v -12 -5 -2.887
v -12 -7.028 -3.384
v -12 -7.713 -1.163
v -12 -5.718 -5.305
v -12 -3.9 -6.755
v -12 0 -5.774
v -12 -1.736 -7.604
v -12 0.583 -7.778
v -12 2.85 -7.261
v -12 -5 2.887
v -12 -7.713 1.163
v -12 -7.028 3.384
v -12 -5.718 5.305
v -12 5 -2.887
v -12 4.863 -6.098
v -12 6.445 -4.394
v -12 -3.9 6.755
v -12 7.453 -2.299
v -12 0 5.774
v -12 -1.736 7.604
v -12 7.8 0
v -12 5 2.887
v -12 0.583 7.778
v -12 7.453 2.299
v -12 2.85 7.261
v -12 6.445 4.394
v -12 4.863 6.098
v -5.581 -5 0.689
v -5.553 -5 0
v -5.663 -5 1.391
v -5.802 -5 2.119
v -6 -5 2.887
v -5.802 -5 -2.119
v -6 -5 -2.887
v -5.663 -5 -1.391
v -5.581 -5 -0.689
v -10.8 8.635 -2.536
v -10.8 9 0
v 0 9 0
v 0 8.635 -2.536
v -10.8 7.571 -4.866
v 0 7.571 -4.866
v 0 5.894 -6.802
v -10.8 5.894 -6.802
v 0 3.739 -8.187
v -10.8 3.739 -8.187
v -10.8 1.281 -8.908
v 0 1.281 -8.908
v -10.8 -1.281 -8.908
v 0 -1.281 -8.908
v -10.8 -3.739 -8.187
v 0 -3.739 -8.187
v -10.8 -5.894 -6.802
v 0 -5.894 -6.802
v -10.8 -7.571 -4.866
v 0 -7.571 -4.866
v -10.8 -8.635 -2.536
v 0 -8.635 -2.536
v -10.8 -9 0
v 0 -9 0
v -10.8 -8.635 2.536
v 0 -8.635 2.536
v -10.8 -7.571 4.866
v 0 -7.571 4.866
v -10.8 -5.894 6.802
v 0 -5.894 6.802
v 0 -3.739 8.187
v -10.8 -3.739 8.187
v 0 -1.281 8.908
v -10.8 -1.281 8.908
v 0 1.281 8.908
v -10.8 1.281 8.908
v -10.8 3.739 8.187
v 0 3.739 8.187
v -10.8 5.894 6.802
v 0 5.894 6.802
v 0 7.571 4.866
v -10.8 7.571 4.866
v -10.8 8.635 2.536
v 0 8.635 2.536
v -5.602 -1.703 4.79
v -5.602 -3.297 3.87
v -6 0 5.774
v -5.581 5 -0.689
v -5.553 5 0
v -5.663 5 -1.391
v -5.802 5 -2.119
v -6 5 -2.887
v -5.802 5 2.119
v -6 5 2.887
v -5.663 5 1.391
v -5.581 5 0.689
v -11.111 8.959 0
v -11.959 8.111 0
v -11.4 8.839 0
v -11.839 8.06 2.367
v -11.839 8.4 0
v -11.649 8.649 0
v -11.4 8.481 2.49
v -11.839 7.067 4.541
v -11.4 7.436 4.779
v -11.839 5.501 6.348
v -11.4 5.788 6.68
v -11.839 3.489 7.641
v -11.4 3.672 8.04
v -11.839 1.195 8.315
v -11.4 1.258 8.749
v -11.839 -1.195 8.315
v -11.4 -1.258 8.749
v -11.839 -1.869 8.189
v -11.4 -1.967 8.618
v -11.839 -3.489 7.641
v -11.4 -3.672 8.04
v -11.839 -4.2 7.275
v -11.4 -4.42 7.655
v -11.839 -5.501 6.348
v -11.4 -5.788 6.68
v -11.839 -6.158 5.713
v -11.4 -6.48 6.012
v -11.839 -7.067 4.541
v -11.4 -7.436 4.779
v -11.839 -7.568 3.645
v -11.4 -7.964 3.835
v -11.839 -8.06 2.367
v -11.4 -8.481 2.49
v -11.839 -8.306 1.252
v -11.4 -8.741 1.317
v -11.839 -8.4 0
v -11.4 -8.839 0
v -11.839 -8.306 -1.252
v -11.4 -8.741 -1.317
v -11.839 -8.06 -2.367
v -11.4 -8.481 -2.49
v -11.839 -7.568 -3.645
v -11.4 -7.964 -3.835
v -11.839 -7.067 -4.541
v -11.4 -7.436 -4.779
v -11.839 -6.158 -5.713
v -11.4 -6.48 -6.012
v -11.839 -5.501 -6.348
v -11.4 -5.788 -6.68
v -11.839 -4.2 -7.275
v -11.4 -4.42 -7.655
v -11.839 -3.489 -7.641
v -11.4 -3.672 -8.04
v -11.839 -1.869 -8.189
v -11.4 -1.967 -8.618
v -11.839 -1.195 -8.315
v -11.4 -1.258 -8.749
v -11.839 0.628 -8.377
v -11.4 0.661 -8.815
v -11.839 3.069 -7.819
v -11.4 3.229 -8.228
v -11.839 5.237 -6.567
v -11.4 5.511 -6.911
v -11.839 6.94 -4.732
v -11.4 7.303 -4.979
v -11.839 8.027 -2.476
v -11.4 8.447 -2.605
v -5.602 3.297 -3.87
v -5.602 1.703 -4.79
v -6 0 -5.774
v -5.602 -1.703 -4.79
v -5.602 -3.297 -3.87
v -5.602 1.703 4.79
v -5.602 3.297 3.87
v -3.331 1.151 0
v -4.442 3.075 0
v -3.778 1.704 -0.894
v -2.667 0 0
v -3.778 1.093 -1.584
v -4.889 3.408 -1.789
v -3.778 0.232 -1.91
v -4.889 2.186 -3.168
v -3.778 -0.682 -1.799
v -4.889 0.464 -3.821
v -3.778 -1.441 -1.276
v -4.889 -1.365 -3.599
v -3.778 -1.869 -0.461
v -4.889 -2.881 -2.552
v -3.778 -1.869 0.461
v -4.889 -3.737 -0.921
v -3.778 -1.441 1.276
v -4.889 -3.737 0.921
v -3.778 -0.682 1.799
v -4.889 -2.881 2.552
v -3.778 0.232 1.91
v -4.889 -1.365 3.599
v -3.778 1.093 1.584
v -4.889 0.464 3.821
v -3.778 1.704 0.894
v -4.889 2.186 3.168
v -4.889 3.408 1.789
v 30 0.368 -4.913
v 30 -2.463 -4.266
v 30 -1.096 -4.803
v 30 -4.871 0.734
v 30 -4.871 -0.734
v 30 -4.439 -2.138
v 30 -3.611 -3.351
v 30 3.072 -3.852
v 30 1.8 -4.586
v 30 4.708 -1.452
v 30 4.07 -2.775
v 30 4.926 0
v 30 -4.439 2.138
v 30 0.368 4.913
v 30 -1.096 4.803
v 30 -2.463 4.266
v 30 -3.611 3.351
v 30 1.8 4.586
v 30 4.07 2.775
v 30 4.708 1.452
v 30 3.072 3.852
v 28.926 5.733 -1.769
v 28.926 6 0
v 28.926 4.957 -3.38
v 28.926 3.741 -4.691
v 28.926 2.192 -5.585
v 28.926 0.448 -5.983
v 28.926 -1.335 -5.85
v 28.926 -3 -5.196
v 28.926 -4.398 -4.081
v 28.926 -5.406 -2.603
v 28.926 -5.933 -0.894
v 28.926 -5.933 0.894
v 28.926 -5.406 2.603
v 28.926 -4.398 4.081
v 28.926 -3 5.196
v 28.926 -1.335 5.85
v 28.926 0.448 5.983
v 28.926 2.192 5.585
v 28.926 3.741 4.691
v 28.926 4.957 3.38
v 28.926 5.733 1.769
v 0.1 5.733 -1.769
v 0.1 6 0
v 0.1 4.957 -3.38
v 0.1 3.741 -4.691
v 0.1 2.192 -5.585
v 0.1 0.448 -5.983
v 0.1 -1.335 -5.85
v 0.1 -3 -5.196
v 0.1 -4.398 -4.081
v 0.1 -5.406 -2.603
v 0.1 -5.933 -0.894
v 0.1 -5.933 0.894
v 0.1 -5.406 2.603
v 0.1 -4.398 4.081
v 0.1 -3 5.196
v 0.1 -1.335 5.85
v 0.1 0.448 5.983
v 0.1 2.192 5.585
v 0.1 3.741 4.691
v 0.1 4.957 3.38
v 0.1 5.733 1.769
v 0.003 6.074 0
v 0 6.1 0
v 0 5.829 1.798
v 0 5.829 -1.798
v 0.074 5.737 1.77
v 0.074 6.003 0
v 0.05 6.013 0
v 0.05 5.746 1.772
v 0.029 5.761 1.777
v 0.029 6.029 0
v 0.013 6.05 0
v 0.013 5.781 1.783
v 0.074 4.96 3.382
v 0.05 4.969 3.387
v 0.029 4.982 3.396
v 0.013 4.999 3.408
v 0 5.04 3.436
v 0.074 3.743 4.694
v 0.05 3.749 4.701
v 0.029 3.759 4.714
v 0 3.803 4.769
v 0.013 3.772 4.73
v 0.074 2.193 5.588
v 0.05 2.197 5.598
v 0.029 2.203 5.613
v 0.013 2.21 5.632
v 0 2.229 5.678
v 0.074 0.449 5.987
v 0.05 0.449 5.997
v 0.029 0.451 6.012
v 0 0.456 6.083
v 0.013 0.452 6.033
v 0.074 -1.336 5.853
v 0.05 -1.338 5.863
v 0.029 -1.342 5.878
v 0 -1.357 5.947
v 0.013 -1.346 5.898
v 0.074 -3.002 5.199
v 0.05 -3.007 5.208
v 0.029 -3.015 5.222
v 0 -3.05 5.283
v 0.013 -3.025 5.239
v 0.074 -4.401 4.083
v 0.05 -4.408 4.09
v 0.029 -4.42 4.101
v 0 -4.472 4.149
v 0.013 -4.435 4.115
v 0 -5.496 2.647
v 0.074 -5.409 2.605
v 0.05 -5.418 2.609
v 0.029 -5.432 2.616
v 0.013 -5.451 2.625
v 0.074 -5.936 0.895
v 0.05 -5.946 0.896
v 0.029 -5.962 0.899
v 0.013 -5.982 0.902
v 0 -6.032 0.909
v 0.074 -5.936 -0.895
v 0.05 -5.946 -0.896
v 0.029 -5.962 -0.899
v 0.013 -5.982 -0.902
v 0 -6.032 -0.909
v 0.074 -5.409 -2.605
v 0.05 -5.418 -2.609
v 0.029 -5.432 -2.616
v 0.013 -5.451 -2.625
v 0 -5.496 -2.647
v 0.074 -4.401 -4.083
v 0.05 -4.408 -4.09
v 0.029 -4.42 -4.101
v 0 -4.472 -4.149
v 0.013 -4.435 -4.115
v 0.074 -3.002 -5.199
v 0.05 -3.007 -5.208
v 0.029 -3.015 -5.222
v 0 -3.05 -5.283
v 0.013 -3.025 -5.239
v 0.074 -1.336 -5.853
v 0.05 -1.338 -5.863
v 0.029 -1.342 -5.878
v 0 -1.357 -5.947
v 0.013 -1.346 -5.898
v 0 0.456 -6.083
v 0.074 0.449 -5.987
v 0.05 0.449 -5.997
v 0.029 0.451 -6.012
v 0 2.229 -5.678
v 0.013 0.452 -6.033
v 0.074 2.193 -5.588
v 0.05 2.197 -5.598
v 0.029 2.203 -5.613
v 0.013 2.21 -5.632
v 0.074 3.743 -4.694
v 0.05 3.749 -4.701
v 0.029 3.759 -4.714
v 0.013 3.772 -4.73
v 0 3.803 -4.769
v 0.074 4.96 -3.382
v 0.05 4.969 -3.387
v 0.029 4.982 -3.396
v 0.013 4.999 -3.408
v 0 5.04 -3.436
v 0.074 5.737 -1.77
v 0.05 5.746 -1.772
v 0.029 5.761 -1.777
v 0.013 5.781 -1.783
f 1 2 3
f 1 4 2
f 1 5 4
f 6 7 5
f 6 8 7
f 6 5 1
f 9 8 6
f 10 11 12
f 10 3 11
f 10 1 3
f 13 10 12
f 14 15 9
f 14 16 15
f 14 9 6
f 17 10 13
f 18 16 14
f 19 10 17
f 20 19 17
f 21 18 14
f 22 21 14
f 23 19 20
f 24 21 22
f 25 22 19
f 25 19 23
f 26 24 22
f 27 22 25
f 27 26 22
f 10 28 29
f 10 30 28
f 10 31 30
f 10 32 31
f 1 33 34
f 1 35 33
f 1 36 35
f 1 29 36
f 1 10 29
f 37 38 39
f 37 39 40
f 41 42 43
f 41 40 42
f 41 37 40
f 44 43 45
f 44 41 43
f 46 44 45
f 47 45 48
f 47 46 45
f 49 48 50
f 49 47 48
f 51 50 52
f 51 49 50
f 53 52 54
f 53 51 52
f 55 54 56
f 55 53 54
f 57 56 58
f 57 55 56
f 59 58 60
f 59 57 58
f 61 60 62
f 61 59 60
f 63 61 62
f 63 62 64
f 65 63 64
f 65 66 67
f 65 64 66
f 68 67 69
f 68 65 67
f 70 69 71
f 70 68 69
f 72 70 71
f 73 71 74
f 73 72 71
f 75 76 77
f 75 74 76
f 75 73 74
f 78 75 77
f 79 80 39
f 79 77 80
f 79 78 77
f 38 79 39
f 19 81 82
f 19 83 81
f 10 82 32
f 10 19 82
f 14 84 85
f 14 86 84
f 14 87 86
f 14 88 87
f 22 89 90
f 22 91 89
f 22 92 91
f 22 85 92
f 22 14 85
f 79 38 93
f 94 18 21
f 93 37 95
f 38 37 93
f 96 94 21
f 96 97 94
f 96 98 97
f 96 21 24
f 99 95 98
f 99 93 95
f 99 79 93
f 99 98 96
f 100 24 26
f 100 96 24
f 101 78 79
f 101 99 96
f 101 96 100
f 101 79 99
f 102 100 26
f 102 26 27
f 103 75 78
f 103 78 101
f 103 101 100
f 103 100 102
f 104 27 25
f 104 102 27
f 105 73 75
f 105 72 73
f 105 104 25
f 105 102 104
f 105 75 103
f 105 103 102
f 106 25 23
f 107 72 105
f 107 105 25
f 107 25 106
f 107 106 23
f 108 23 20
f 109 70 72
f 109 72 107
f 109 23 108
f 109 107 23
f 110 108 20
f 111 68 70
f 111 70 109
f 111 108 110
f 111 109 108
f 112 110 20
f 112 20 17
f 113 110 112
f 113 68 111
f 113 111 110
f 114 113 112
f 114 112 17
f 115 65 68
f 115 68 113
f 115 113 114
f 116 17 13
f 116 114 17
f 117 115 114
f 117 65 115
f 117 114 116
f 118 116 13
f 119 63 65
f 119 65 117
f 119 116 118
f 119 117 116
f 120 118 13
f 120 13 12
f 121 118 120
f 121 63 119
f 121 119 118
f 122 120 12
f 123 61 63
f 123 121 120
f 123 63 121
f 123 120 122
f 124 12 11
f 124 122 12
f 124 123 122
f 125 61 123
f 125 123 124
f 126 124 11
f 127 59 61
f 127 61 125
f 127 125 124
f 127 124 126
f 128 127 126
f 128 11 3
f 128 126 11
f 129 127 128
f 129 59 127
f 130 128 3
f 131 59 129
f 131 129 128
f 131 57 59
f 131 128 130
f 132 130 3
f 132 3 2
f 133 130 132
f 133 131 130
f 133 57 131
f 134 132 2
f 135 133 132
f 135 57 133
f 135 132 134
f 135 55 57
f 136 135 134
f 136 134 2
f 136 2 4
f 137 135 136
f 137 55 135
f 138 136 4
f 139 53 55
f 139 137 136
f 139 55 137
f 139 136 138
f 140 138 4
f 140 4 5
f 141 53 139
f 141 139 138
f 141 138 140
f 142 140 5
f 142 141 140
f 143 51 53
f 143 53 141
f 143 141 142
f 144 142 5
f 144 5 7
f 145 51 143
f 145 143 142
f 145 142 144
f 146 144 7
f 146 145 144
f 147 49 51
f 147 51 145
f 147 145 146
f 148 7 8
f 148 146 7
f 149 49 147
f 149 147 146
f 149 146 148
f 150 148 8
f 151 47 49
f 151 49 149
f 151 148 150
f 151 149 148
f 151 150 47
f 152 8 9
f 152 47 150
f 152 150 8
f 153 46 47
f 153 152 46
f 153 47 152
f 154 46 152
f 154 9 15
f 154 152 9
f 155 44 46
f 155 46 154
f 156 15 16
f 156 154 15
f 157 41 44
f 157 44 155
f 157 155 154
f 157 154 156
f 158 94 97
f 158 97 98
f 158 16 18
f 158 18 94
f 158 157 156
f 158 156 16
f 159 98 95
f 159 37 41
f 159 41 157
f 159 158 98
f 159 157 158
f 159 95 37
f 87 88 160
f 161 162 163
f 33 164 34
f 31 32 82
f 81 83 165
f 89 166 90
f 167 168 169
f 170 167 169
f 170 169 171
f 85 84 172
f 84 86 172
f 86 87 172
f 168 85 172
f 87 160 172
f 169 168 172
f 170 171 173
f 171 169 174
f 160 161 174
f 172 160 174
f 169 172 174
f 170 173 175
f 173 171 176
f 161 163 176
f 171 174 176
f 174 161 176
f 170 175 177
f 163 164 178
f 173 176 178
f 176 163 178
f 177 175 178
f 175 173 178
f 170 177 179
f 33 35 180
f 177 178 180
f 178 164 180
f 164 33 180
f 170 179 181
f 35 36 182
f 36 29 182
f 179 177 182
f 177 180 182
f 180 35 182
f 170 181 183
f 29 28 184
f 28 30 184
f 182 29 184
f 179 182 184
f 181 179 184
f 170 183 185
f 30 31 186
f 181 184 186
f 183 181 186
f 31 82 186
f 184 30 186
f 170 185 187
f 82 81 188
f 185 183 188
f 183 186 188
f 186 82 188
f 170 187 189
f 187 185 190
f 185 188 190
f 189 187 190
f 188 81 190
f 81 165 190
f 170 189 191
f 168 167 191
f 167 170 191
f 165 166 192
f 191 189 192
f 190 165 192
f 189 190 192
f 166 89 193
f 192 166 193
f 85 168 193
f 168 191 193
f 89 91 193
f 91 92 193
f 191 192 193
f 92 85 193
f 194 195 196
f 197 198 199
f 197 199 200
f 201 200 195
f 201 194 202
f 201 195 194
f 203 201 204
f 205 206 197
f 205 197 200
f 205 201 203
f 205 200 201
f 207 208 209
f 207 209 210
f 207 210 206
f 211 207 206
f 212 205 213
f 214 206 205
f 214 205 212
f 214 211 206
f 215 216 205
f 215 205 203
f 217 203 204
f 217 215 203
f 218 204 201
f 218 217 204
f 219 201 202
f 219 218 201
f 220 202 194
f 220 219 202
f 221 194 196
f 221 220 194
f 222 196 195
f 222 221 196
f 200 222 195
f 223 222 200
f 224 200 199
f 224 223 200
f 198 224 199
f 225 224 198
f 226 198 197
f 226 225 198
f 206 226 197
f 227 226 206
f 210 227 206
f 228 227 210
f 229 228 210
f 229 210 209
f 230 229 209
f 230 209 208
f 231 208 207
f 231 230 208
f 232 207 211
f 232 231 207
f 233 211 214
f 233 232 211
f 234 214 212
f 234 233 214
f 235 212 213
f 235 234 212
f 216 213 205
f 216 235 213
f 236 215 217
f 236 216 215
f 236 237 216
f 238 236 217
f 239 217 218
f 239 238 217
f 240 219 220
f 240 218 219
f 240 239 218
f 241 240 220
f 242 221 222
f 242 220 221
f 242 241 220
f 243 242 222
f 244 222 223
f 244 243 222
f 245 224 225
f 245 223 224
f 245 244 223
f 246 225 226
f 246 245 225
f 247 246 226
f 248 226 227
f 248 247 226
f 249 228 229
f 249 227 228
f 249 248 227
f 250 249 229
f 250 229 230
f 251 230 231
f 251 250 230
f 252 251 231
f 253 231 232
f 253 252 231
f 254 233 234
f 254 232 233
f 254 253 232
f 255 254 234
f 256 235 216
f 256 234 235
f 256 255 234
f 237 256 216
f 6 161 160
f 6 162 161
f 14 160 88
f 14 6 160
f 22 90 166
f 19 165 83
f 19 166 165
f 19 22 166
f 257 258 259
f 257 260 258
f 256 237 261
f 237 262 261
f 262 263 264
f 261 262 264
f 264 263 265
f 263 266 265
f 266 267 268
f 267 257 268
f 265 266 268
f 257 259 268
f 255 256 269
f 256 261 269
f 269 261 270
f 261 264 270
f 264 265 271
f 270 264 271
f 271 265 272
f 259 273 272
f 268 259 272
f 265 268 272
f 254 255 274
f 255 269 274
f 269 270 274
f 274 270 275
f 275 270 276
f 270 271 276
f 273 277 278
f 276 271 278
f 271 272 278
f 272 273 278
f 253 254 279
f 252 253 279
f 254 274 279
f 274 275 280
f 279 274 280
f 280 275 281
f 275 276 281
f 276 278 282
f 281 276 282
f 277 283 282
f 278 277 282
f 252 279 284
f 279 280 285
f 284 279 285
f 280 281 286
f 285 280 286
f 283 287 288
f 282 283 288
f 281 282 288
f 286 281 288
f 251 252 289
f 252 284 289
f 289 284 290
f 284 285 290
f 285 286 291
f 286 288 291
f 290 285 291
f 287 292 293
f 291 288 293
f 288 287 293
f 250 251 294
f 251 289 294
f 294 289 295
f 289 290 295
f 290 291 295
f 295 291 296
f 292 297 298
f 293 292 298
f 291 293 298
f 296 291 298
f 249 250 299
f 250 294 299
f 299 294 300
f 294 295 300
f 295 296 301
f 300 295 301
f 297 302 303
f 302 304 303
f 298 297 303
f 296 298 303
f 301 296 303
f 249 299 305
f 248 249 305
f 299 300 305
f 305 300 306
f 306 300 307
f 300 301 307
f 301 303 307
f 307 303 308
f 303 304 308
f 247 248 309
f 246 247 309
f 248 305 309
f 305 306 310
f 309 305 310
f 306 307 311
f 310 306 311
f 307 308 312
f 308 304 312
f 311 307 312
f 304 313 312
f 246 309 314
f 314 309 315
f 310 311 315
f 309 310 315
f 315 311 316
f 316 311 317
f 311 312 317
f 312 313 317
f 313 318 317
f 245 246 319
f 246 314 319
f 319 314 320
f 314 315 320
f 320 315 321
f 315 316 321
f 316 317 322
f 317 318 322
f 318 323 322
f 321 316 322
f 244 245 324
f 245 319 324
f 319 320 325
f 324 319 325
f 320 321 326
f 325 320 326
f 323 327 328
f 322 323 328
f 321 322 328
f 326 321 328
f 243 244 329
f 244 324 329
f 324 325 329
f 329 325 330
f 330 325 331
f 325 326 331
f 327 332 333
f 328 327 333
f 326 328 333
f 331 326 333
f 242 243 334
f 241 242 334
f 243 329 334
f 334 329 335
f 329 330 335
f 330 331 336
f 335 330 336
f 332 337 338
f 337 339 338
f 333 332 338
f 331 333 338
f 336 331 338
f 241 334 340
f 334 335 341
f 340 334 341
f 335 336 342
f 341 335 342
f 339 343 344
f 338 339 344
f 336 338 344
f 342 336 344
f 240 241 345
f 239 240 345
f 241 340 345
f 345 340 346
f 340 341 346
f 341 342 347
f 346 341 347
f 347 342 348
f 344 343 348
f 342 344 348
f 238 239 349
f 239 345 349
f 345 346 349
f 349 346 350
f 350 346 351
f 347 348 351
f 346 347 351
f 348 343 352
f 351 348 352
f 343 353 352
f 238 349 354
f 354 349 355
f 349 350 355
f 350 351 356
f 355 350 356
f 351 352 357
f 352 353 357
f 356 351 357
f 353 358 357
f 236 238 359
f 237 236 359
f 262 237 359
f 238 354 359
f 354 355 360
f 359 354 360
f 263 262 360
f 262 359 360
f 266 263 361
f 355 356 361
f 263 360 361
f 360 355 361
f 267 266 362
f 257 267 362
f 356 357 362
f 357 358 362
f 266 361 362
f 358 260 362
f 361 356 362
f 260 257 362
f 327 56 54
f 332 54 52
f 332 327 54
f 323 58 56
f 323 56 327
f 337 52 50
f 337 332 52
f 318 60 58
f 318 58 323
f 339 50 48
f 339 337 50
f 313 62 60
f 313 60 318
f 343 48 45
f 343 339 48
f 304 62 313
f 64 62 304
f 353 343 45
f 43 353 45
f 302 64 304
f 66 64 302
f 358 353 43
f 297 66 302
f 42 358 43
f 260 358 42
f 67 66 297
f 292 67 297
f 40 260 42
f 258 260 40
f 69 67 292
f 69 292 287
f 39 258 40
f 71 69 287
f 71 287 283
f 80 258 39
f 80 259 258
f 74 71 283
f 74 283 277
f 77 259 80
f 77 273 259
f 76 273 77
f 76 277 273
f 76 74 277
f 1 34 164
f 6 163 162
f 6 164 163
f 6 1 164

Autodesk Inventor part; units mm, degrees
ref_plane "YZ Plane" through (0, 0, 0) normal (1, 0, 0) x (0, 1, 0)
ref_plane "XZ Plane" through (0, 0, 0) normal (0, 1, 0) x (-1, 0, 0)
sketch "Sketch1" plane through (0, 0, 0) normal (0, 0, 1) x (1, 0, 0)
  line L0 (-2.6667, 0) -> (30, 0)
  line L1 (30, 0) -> (30, 6)
  line L2 (30, 6) -> (4.375, 6)
  line L3 (4.375, 6) -> (3.3014, 6)
  line L4 (3.3014, 6) -> (0, 6)
  line L5 (0, 6) -> (0, 9)
  line L6 (0, 9) -> (-12, 9)
  line L7 (-12, 9) -> (-12, 5.7735)
  line L8 (-12, 5.7735) -> (-6, 5.7735)
  line L9 (-6, 5.7735) -> (-2.6667, 0)
  line L10 (-20.4, 0) -> (38.4, 0) projected
  line L11 (0, -1.8) -> (0, 10.8) projected
  line L12 (4.375, 6) -> (0, 6) construction
  dimension "d1" = 25.625
  dimension "d2" = 1.0736
  dimension "d3" = 12
  dimension "d4" = 6
  dimension "d5" = 60
  dimension "d6" = 12
  dimension "d7" = 12
  dimension "d8" = 11.547
  dimension "d9" = 18
  dimension "d26" = 30
revolve "Body" add sketch "Sketch1" angle 360 about axis through (-2.6667, 0, 0) along (1, 0, 0)
sketch "Sketch2" plane through (-12, 0, 0) normal (-1, 0, 0) x (0, 0, 1)
  circle A0 centre (0, 0) radius 5.7735 projected
  line L0 (0, -12.6) -> (0, 12.6) projected
  line L1 (-12.6, 0) -> (12.6, 0) projected
  line L2 (5.7735, 0) -> (2.8868, -5)
  line L3 (2.8868, -5) -> (-2.8868, -5)
  line L4 (-2.8868, -5) -> (-5.7735, 0)
  line L5 (-5.7735, 0) -> (-2.8868, 5)
  line L6 (-2.8868, 5) -> (2.8868, 5)
  line L7 (2.8868, 5) -> (5.7735, 0)
extrude "Slot" add sketch "Sketch2" against normal up to next contours L7 A0 | A0 L2 | L6 L0 A0 | A0 L0 L3 | L0 L6 A0 | A0 L3 L0 | L4 A0 | A0 L5
fillet "Fillet1" radius 1.2 1 edges at (-12, -9, 0)
thread "Thread" size "M12x1.75" class "6g" standard "ISO Metric profile" length 25.625
chamfer "Chamfer1" distance 1.0735 distance2 1.0735 1 edges at (30, -6, 0) measured on face at (30, 0.7092, -1.4219)
ref_plane "Work Plane1" through (29, 0, 0) normal (0, -1, 0) x (1, 0, 0)
fillet "Fillet2" radius 0.1 1 edges at (0, -6, 0)
equation "\"d1\" = GEL"
equation "\"d3\" = KOH"
equation "\"d4\" = INTI"
equation "\"d6\" = GD"
equation "\"d7\" = BDM"
equation "\"d8\" = 1.1547 * SW"
equation "\"d9\" = KOD"
equation "\"d26\" = NLG"
equation "\"d30\" = R"
equation "\"d17\" = RR"
equation "\"d13\" = GEL"
equation "\"d15\" = -0.5 * SPD + 0.5 * GD"
equation "\"d16\" = GUL"
equation "\"GD\" = NND"
equation "\"NLG\" = 30"
equation "\"GEL\" = 25.625"
equation "\"KOD\" = 18"
equation "\"KOH\" = NND"
equation "\"INTI\" = 6"
equation "\"GAL\" = 0.61345 * PTC"
equation "\"GUL\" = 0.61345 * PTC"
equation "\"BDM\" = NND"
equation "\"RR\" = 0.1 * NND"
equation "\"SPD\" = NND - 1.2269 * PTC"
equation "\"R\" = 0.1"
equation "\"PHH\" = 0.25"
equation "\"GD1\" = THREADDIA - 1.2269 * PTC"
equation "\"THREADDIA\" = 12"
equation "\"FAWI\" = 45deg"
equation "\"PTC\" = 1.75"
equation "\"KOH1\" = 10.8"
equation "\"NND\" = 12"
equation "\"TOA\" = 30deg"
equation "\"E0\" = 1.155 * SW"
equation "\"SW\" = 10"
properties part number "AS 1420 - 1973 - M12 x 30" material "Steel, Mild"
